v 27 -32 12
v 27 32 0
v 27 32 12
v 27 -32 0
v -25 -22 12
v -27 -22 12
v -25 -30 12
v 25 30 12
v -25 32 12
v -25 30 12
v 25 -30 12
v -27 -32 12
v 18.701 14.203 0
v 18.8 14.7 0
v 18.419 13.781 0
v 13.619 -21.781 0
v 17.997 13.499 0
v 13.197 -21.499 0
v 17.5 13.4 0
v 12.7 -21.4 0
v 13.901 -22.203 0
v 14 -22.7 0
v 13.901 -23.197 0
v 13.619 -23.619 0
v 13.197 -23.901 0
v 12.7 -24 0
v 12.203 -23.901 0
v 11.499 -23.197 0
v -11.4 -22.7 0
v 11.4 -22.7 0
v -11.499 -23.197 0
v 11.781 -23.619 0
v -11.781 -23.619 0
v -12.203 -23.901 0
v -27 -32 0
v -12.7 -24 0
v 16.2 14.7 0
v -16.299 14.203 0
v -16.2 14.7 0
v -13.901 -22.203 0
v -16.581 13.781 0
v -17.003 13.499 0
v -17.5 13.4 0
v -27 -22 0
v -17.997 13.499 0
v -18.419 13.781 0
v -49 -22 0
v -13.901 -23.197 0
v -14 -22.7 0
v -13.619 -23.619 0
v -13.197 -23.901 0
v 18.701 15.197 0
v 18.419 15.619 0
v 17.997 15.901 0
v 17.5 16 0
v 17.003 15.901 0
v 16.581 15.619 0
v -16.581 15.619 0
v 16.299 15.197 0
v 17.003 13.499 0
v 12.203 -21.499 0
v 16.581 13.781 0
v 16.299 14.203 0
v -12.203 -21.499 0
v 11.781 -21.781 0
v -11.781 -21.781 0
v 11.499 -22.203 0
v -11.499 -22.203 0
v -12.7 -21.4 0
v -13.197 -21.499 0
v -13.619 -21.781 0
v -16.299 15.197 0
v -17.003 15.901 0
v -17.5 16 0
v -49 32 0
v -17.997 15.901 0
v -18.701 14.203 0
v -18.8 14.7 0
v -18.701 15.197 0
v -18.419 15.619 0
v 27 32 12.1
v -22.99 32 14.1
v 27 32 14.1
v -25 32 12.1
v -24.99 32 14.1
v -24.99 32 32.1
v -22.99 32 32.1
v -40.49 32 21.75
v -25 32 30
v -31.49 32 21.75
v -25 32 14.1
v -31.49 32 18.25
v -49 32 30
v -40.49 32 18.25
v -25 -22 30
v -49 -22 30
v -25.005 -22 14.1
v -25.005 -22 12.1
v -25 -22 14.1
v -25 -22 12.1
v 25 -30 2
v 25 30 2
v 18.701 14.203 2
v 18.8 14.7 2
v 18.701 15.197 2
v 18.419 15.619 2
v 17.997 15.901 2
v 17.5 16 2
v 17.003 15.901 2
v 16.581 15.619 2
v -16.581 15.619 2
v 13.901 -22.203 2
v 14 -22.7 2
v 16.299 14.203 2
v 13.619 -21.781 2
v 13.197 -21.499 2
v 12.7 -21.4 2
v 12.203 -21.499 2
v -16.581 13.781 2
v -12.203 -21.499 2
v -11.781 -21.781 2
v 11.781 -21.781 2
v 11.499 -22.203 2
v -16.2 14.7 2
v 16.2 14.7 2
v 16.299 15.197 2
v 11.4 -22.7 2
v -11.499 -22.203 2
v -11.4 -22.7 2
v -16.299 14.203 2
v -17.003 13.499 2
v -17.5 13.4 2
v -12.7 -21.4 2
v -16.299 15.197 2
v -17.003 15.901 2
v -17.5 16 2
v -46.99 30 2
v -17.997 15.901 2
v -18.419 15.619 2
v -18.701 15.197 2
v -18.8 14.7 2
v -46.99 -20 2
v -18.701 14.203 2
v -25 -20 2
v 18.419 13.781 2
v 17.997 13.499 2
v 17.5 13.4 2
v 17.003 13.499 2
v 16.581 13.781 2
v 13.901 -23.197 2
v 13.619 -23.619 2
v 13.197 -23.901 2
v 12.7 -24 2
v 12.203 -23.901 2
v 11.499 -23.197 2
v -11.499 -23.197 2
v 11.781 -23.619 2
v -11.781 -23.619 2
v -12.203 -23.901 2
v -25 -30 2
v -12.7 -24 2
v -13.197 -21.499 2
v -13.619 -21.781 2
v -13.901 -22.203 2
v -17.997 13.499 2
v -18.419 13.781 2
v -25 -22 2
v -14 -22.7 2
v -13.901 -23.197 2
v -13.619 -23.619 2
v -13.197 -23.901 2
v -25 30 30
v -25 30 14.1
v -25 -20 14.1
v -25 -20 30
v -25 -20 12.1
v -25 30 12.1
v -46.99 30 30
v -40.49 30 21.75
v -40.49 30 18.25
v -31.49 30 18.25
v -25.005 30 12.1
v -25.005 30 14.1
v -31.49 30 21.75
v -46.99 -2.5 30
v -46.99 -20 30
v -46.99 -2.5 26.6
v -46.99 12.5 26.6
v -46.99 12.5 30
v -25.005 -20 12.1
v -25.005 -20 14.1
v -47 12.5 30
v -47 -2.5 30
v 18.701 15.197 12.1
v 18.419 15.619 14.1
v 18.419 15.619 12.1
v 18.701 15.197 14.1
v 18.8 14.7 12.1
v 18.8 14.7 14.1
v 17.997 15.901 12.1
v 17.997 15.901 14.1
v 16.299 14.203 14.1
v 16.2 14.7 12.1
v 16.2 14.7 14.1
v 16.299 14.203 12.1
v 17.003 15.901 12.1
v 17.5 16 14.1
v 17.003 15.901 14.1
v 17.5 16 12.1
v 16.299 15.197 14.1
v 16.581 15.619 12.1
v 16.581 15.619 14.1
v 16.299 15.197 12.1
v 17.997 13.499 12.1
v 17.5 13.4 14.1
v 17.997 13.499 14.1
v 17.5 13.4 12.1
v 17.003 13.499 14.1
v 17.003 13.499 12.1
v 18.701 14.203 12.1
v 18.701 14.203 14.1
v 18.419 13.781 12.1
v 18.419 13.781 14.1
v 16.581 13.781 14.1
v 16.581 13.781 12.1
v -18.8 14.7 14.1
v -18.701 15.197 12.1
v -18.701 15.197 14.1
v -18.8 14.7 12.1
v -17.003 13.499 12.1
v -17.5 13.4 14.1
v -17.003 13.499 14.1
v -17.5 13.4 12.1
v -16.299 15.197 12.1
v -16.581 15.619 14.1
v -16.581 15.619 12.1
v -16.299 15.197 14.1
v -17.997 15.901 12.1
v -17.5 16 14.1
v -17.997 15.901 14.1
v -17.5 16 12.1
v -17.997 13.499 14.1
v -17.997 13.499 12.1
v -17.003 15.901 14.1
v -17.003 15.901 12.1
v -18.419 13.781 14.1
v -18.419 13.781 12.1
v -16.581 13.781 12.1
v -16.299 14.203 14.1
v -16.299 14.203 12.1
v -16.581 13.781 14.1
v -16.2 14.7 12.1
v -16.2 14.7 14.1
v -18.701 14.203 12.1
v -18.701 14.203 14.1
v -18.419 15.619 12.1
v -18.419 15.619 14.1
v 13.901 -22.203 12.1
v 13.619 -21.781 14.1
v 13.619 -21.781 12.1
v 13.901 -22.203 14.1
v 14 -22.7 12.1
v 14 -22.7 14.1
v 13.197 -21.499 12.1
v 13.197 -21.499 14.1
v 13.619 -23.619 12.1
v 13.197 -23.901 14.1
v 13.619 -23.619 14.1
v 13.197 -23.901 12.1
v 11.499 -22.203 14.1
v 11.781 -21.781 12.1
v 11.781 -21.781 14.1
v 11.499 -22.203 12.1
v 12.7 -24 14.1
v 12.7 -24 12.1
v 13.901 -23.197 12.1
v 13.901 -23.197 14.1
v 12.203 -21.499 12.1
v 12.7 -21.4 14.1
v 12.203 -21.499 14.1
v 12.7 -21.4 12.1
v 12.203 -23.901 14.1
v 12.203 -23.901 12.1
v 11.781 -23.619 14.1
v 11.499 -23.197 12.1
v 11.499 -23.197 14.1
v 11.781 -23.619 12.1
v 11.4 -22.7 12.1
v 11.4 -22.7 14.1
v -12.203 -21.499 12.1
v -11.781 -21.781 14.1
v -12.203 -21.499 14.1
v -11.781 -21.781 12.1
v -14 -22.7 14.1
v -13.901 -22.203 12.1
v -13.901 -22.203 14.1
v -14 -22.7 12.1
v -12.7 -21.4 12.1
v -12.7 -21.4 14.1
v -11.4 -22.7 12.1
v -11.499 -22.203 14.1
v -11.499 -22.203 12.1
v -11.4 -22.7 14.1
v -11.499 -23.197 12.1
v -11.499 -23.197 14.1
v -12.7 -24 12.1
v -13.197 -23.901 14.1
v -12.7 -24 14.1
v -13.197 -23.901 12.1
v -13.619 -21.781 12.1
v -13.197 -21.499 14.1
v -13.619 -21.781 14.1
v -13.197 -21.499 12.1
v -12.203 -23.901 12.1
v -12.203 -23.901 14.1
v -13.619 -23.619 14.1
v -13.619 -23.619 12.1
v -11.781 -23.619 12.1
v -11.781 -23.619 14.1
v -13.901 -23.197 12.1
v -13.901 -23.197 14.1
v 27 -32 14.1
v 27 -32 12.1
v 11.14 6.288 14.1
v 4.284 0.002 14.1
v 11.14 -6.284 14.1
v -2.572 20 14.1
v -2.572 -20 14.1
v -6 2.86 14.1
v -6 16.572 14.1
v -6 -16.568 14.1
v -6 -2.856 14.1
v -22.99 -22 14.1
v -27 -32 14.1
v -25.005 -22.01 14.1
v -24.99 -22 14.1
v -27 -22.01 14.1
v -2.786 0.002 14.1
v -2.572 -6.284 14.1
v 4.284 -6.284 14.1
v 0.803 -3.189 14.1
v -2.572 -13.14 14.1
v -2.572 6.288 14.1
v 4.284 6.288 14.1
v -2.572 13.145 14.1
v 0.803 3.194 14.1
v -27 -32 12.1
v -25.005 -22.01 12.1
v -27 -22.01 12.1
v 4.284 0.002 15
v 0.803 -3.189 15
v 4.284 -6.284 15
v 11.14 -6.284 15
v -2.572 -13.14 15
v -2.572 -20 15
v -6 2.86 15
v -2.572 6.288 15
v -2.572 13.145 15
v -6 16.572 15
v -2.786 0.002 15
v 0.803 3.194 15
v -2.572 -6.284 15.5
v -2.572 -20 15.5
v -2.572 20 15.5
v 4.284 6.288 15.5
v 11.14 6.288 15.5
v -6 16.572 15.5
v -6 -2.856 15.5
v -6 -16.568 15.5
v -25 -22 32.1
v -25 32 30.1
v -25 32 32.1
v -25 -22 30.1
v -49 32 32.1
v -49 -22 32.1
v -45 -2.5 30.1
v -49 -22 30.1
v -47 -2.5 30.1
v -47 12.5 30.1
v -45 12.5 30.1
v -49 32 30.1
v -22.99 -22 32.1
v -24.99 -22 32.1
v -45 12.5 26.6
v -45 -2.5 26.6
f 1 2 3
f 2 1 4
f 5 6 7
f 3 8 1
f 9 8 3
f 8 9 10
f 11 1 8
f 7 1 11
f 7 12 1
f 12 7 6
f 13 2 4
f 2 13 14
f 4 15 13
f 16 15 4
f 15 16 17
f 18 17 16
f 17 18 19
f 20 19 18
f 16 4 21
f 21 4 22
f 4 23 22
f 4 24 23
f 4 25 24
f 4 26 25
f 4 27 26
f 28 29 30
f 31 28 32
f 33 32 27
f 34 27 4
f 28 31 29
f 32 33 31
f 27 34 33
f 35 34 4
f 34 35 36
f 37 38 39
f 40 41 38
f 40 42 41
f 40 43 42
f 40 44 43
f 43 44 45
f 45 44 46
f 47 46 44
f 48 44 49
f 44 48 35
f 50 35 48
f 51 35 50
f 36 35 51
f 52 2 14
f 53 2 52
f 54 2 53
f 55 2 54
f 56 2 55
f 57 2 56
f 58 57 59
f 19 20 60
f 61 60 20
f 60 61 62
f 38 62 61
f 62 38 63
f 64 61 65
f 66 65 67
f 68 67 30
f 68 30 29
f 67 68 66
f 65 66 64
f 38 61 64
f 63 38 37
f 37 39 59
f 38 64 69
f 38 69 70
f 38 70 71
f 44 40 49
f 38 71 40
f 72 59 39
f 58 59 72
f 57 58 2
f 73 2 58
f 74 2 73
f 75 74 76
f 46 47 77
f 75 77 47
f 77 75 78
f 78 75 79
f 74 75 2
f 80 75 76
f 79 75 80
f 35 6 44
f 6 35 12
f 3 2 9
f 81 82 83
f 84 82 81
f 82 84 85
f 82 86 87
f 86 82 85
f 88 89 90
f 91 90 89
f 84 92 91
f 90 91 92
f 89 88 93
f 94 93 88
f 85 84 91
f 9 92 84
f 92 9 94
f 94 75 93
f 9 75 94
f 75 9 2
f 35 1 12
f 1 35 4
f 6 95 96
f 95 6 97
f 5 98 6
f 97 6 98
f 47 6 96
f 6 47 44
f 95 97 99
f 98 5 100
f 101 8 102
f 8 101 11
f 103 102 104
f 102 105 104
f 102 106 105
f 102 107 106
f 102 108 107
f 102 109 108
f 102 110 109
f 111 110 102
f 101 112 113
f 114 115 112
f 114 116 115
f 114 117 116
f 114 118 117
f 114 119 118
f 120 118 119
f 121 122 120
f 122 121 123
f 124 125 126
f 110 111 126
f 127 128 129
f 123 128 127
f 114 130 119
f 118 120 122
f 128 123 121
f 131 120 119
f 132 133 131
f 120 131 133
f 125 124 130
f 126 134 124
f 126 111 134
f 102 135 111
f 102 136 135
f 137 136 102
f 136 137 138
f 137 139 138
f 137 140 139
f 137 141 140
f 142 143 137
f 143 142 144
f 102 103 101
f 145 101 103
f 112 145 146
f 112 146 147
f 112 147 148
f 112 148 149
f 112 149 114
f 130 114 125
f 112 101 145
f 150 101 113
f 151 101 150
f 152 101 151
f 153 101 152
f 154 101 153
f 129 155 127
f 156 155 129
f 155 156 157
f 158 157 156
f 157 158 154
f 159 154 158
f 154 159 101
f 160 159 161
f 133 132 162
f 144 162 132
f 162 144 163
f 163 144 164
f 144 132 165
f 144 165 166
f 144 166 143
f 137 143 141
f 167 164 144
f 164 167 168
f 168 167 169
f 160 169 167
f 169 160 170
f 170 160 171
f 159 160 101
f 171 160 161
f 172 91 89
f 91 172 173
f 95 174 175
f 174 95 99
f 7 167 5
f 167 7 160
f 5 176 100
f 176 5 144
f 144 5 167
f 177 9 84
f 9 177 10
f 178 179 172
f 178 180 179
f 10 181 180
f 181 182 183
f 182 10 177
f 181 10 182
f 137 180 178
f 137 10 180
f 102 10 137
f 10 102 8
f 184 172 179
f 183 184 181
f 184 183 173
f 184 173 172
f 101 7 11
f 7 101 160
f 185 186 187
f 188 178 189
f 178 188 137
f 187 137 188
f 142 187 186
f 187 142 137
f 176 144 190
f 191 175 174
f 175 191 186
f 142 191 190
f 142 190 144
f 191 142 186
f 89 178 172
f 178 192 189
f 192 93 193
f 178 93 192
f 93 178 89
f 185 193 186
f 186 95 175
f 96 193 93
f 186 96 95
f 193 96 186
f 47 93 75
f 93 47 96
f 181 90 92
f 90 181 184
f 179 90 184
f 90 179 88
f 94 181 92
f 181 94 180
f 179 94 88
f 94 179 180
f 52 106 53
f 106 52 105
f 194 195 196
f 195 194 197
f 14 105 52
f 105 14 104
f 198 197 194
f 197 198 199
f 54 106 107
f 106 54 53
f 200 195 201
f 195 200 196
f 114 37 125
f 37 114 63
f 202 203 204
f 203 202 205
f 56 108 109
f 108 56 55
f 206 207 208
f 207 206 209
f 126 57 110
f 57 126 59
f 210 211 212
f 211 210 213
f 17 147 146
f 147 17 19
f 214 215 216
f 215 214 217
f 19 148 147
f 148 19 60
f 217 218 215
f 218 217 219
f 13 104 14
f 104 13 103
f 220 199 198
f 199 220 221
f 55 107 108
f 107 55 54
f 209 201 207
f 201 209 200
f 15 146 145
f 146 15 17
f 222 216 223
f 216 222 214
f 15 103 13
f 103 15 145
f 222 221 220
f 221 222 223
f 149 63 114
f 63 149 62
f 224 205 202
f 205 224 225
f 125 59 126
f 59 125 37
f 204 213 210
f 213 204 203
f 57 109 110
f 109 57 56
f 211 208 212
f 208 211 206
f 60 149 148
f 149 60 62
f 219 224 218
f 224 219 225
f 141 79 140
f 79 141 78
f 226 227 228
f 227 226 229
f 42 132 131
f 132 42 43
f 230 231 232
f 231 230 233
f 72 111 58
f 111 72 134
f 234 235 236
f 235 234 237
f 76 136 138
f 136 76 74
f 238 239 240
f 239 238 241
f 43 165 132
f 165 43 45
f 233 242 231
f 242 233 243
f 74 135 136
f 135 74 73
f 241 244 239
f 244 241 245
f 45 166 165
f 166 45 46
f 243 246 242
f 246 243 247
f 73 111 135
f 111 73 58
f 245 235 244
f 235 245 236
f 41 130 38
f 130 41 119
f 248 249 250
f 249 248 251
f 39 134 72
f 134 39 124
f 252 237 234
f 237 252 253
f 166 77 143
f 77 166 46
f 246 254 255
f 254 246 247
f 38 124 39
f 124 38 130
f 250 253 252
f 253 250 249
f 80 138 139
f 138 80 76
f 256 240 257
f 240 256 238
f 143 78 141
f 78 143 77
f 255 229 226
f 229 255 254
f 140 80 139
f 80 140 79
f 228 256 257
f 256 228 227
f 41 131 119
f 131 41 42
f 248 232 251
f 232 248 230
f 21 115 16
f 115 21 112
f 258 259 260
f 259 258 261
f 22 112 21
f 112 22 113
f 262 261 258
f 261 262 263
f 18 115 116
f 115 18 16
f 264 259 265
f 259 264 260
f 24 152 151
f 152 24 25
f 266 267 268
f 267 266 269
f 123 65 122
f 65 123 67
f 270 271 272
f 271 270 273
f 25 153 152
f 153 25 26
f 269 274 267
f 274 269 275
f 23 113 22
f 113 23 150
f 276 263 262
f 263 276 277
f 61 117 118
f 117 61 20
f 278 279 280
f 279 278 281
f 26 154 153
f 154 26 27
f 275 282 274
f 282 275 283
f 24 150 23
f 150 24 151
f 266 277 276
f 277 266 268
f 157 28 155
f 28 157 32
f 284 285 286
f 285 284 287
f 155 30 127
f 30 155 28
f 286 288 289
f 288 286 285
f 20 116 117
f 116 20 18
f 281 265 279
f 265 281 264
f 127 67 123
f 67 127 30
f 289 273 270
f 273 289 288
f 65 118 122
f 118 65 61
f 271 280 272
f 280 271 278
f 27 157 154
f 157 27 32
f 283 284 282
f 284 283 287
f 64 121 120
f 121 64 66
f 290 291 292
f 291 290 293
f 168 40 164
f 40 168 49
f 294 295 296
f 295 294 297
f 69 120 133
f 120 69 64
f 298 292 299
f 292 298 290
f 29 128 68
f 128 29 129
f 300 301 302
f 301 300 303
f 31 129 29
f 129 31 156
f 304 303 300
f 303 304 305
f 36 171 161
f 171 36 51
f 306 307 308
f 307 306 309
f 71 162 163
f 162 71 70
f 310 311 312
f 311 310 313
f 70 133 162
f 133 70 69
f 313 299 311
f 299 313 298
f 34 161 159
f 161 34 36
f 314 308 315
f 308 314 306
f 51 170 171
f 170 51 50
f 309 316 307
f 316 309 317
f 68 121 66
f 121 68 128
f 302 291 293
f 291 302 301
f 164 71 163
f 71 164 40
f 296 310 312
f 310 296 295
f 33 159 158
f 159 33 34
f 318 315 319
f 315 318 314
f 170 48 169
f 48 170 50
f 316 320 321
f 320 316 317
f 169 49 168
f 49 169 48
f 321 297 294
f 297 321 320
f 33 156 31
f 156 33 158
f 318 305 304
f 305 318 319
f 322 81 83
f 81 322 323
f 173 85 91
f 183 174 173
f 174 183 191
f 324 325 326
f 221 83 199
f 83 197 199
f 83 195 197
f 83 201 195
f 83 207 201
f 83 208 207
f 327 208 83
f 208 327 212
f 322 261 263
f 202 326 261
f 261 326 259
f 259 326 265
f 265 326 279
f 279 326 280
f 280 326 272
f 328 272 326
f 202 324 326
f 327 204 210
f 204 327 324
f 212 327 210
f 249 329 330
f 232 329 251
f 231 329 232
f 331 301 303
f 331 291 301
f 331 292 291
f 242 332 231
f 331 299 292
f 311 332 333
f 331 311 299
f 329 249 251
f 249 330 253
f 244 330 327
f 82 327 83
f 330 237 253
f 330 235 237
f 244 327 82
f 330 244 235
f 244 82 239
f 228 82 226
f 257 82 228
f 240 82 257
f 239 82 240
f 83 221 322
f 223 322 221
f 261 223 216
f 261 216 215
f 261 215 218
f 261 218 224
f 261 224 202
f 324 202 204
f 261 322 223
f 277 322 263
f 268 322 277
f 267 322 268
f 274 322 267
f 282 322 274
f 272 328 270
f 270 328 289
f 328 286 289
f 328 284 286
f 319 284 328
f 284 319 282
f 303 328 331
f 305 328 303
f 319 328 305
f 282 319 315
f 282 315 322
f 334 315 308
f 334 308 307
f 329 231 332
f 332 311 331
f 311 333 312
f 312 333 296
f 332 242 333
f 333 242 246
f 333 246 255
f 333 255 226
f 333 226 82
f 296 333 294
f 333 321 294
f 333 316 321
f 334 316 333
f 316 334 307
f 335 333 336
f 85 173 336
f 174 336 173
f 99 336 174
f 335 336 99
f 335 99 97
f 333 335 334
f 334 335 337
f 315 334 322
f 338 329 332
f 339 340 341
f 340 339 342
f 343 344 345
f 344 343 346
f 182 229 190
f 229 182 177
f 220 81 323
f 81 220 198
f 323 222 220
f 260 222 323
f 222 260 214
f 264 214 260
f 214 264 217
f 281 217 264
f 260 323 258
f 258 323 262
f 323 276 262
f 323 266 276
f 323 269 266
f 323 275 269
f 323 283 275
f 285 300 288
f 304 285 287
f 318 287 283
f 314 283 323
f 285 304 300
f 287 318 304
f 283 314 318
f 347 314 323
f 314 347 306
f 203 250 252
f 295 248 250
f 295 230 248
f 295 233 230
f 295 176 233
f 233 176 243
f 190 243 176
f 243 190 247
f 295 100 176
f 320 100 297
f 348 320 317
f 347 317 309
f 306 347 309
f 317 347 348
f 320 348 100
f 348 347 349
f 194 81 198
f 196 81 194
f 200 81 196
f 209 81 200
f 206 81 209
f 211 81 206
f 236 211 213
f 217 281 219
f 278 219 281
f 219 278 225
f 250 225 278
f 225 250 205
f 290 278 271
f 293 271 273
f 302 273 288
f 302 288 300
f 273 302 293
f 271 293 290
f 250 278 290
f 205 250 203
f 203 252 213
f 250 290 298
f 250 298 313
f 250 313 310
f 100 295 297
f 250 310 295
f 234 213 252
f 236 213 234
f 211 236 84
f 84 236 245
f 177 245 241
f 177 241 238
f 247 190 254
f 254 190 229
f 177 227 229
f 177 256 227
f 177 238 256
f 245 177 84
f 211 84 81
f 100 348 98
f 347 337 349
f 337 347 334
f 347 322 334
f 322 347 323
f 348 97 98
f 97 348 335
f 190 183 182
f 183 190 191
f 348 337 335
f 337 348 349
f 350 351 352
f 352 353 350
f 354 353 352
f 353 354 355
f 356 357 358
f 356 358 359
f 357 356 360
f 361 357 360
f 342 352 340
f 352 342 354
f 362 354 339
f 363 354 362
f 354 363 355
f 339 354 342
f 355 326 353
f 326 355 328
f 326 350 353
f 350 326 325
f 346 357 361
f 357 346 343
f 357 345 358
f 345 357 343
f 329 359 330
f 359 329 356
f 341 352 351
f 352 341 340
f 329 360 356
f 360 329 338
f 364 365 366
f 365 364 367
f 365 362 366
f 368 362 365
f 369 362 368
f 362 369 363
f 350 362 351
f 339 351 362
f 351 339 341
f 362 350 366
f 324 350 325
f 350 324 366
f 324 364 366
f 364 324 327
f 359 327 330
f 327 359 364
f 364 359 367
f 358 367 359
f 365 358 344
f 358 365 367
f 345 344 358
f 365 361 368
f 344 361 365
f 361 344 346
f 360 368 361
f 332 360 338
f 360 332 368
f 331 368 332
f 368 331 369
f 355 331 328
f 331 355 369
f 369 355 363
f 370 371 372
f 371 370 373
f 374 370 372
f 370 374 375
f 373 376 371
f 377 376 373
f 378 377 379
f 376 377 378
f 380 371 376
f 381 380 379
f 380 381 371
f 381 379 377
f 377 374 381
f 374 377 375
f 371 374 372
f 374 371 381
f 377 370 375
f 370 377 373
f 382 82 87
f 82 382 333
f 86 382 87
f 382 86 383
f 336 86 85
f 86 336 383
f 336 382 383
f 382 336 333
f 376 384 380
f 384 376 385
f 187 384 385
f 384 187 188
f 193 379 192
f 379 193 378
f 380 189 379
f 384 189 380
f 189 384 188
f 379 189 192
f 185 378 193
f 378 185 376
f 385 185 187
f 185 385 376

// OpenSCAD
$fn = 16;
wallThickness = 2;

base(wallThickness);

module logo() {
    linear_extrude(1)
    scale(40)
    translate([-0.25,0.5,0])
    rotate([0,0,-90])
    polygon([[0.0857,0], [0.4285,0], [0.6571,0.2571], [0.8285,0.0857], [1,0.0857], [0.6571,0.4285], [0.3428,0.0857], [0.0857,0.0857]]);
    linear_extrude(1.5)
    scale(40)
    translate([-0.25,0.5,0])
    rotate([0,0,-90])
    polygon([[0.0857,0], [0.3428,0.2571], [0.5714,0], [0.9142,0], [1,0.0857], [0.6571,0.0857], [0.3428,0.4285], [0,0.0857]]);
}

module base(thickness) {
    difference() {
        union() {
            difference() {
                union() {
                    translate([0,0,5+thickness/2])
                    cube([50+thickness*2,60+thickness*2,10+thickness], center = true);
                    translate([-35,5,5+thickness/2])
                    cube([20+thickness*2,50+thickness*2,10+thickness], center = true);
                }
                translate([0,0,5+thickness/2+thickness])
                cube([50,60,10+thickness], center = true);
                translate([-35+0.01-thickness/2,5,5+thickness/2+thickness])
                cube([20+thickness,50,10+thickness], center = true);
            }
            difference() {
                translate([-35-thickness,5,15])
                cube([20+thickness*2,50+thickness*2,30], center = true);
                
                translate([-34.99+thickness/2-thickness,5,15])
                cube([20+thickness,50,31], center = true);
                
                translate([-35+0.01-thickness/2,25+thickness*2,28-8])
                cube([9,thickness*10,3.5], center = true);
            }
        }
        
        translate([0,0,-5]) {
            //RFID PINS
            translate([20-1.3-1.2,30-1.3-14,0])
            cylinder(r = 1.3, h = 20);
            mirror([1,0,0])
            translate([20-1.3-1.2,30-1.3-14,0])
            cylinder(r = 1.3, h = 20);

            translate([20-1.3-6,-30+1.3+6,0])
            cylinder(r = 1.3, h = 20);
            mirror([1,0,0])
            translate([20-1.3-6,-30+1.3+6,0])
            cylinder(r = 1.3, h = 20);
        }
    }

    difference() {
        translate([0,0,0.1]) {
            difference() {
                translate([0,0,10+thickness/2+thickness])
                cube([50+thickness*2,60+thickness*2,thickness], center = true);
                translate([-26-0.01,5,11.01+thickness/2])
                cube([thickness+0.01,50.02+thickness*2,thickness*2], center = true);
            }
            translate([-35-thickness,5,30+thickness/2])
            cube([20+thickness*2,50+thickness*2,thickness], center = true);
            
            translate([-26+0.01+thickness,5,21+thickness/2])
            cube([thickness,50+thickness*2,18+thickness], center = true);
            
            translate([-46,5,28.5])
            cube([thickness,15,4], center = true);
            
            color([0,0.5,0])
            translate([4,0,13.9])
            logo();
        }
        translate([0,0,-5]) {
            //RFID PINS
            translate([20-1.3-1.2,30-1.3-14,0])
            cylinder(r = 1.3, h = 20);
            mirror([1,0,0])
            translate([20-1.3-1.2,30-1.3-14,0])
            cylinder(r = 1.3, h = 20);

            translate([20-1.3-6,-30+1.3+6,0])
            cylinder(r = 1.3, h = 20);
            mirror([1,0,0])
            translate([20-1.3-6,-30+1.3+6,0])
            cylinder(r = 1.3, h = 20);
        }
    }
}
module tube(innerRadius, outerRadius, height) {
    difference() {
        cylinder(r = outerRadius, h = height);
        translate([0,0,-1]) cylinder(r = innerRadius, h = height + 2);
    }
}

module pieSlice(r, start_angle, end_angle, height=10) {
    R = r * sqrt(2) + 1;
    a0 = (4 * start_angle + 0 * end_angle) / 4;
    a1 = (3 * start_angle + 1 * end_angle) / 4;
    a2 = (2 * start_angle + 2 * end_angle) / 4;
    a3 = (1 * start_angle + 3 * end_angle) / 4;
    a4 = (0 * start_angle + 4 * end_angle) / 4;
    if(end_angle > start_angle)
        linear_extrude(height) {
            intersection() {
            circle(r);
            polygon([
                [0,0],
                [R * cos(a0), R * sin(a0)],
                [R * cos(a1), R * sin(a1)],
                [R * cos(a2), R * sin(a2)],
                [R * cos(a3), R * sin(a3)],
                [R * cos(a4), R * sin(a4)],
                [0,0]
           ]);
          }
    }
}
